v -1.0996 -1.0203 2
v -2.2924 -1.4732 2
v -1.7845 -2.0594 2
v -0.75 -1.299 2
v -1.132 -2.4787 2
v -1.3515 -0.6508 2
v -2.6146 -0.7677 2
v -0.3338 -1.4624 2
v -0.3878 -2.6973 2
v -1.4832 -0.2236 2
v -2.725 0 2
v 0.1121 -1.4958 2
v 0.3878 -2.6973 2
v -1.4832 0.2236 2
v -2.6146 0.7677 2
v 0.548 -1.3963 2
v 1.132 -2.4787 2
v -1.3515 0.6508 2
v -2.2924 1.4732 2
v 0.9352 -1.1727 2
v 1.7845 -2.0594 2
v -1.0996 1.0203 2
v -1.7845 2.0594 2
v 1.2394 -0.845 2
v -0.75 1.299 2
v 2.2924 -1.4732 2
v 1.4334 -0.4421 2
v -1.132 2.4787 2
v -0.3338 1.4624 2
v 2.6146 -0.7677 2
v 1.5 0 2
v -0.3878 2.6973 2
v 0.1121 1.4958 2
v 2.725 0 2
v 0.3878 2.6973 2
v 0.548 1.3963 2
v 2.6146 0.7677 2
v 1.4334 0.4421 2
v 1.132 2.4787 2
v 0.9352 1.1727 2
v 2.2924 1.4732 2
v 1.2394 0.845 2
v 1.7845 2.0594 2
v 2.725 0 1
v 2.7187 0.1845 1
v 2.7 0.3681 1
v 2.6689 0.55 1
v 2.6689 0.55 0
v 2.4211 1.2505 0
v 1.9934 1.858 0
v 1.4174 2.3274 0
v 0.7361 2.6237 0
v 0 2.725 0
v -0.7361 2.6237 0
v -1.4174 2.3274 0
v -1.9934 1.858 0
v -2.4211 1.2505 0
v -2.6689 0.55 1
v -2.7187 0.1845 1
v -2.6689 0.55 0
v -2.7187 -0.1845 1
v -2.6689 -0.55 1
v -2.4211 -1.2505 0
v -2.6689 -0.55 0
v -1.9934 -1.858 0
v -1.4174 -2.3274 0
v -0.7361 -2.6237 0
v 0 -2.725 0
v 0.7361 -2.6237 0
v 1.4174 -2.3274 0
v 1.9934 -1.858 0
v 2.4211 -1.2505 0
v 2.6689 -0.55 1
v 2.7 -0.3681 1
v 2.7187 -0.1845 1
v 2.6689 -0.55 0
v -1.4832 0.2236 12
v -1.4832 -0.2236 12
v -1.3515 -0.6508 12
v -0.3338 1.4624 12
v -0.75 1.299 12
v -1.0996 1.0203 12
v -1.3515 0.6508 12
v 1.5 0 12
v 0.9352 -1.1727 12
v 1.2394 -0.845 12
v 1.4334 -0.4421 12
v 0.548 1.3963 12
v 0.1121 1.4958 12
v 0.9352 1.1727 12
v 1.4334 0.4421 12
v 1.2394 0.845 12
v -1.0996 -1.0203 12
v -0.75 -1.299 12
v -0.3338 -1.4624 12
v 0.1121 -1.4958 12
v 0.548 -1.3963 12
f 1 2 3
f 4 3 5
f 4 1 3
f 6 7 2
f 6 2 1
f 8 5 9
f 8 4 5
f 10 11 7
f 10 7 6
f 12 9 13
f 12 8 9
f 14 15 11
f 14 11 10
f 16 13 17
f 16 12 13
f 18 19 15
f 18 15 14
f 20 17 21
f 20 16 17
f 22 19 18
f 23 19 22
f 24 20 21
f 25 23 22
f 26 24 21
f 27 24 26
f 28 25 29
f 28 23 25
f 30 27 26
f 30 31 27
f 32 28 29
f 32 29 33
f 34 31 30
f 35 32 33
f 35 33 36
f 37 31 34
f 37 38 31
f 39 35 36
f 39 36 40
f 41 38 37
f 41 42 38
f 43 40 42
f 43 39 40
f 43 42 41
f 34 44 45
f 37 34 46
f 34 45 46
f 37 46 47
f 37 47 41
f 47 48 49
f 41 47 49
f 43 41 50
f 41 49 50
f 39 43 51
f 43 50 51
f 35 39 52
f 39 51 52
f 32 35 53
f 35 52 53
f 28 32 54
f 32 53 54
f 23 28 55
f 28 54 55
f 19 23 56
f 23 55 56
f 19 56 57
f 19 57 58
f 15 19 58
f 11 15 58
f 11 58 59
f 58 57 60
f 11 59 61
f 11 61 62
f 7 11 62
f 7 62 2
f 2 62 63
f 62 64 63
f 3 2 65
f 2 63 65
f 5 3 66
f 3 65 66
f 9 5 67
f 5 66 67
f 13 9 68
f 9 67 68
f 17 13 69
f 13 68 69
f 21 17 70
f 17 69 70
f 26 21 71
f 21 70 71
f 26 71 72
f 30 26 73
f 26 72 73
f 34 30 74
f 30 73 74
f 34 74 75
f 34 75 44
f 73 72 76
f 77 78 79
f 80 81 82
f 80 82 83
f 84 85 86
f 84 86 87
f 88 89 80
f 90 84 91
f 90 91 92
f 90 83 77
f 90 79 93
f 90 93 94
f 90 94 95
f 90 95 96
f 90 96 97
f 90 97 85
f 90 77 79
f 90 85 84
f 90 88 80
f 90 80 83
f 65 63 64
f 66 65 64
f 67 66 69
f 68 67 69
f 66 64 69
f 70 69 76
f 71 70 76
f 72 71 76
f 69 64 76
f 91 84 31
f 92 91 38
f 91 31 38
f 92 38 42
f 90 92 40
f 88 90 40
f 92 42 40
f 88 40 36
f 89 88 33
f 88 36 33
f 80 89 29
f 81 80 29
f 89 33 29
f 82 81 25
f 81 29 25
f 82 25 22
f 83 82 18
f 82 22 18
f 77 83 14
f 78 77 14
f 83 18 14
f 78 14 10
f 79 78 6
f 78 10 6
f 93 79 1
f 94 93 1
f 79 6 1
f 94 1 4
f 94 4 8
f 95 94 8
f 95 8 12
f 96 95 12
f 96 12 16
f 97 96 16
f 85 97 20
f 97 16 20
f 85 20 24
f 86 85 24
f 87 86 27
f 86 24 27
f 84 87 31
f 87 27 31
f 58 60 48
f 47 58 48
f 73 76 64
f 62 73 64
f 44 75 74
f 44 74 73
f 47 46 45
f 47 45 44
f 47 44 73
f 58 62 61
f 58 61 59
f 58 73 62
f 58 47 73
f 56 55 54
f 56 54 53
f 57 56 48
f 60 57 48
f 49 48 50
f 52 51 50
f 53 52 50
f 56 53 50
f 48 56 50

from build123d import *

# Parameters (mm, degrees)
SKETCH1_R          = 2.725
EXTRUDE1_DEPTH     = 2
CUT_EXTRUDE1_DEPTH = 1
SKETCH3_R          = 1.5
EXTRUDE2_DEPTH     = 10


with BuildPart() as part:
    # Sketch1 → Extrude1 (new body)
    with BuildSketch(Plane.XY):
        Circle(SKETCH1_R)
    extrude(amount=EXTRUDE1_DEPTH)

    # Sketch2 → Cut-Extrude1 (cut)
    with BuildSketch(Plane(origin=(0, 0, 0), x_dir=(-1, 0, 0), z_dir=(0, 0, -1))):
        Polygon((3.449801909, 0), (3.449801909, 0.55), (-3.901269584, 0.55), (-3.901269584, -0.55), (3.449801909, -0.55), align=None)
    extrude(amount=-CUT_EXTRUDE1_DEPTH, mode=Mode.SUBTRACT)

    # Sketch3 → Extrude2 (add)
    with BuildSketch(Plane.XY.offset(2)):
        Circle(SKETCH3_R)
    extrude(amount=EXTRUDE2_DEPTH)


solid = part.part
